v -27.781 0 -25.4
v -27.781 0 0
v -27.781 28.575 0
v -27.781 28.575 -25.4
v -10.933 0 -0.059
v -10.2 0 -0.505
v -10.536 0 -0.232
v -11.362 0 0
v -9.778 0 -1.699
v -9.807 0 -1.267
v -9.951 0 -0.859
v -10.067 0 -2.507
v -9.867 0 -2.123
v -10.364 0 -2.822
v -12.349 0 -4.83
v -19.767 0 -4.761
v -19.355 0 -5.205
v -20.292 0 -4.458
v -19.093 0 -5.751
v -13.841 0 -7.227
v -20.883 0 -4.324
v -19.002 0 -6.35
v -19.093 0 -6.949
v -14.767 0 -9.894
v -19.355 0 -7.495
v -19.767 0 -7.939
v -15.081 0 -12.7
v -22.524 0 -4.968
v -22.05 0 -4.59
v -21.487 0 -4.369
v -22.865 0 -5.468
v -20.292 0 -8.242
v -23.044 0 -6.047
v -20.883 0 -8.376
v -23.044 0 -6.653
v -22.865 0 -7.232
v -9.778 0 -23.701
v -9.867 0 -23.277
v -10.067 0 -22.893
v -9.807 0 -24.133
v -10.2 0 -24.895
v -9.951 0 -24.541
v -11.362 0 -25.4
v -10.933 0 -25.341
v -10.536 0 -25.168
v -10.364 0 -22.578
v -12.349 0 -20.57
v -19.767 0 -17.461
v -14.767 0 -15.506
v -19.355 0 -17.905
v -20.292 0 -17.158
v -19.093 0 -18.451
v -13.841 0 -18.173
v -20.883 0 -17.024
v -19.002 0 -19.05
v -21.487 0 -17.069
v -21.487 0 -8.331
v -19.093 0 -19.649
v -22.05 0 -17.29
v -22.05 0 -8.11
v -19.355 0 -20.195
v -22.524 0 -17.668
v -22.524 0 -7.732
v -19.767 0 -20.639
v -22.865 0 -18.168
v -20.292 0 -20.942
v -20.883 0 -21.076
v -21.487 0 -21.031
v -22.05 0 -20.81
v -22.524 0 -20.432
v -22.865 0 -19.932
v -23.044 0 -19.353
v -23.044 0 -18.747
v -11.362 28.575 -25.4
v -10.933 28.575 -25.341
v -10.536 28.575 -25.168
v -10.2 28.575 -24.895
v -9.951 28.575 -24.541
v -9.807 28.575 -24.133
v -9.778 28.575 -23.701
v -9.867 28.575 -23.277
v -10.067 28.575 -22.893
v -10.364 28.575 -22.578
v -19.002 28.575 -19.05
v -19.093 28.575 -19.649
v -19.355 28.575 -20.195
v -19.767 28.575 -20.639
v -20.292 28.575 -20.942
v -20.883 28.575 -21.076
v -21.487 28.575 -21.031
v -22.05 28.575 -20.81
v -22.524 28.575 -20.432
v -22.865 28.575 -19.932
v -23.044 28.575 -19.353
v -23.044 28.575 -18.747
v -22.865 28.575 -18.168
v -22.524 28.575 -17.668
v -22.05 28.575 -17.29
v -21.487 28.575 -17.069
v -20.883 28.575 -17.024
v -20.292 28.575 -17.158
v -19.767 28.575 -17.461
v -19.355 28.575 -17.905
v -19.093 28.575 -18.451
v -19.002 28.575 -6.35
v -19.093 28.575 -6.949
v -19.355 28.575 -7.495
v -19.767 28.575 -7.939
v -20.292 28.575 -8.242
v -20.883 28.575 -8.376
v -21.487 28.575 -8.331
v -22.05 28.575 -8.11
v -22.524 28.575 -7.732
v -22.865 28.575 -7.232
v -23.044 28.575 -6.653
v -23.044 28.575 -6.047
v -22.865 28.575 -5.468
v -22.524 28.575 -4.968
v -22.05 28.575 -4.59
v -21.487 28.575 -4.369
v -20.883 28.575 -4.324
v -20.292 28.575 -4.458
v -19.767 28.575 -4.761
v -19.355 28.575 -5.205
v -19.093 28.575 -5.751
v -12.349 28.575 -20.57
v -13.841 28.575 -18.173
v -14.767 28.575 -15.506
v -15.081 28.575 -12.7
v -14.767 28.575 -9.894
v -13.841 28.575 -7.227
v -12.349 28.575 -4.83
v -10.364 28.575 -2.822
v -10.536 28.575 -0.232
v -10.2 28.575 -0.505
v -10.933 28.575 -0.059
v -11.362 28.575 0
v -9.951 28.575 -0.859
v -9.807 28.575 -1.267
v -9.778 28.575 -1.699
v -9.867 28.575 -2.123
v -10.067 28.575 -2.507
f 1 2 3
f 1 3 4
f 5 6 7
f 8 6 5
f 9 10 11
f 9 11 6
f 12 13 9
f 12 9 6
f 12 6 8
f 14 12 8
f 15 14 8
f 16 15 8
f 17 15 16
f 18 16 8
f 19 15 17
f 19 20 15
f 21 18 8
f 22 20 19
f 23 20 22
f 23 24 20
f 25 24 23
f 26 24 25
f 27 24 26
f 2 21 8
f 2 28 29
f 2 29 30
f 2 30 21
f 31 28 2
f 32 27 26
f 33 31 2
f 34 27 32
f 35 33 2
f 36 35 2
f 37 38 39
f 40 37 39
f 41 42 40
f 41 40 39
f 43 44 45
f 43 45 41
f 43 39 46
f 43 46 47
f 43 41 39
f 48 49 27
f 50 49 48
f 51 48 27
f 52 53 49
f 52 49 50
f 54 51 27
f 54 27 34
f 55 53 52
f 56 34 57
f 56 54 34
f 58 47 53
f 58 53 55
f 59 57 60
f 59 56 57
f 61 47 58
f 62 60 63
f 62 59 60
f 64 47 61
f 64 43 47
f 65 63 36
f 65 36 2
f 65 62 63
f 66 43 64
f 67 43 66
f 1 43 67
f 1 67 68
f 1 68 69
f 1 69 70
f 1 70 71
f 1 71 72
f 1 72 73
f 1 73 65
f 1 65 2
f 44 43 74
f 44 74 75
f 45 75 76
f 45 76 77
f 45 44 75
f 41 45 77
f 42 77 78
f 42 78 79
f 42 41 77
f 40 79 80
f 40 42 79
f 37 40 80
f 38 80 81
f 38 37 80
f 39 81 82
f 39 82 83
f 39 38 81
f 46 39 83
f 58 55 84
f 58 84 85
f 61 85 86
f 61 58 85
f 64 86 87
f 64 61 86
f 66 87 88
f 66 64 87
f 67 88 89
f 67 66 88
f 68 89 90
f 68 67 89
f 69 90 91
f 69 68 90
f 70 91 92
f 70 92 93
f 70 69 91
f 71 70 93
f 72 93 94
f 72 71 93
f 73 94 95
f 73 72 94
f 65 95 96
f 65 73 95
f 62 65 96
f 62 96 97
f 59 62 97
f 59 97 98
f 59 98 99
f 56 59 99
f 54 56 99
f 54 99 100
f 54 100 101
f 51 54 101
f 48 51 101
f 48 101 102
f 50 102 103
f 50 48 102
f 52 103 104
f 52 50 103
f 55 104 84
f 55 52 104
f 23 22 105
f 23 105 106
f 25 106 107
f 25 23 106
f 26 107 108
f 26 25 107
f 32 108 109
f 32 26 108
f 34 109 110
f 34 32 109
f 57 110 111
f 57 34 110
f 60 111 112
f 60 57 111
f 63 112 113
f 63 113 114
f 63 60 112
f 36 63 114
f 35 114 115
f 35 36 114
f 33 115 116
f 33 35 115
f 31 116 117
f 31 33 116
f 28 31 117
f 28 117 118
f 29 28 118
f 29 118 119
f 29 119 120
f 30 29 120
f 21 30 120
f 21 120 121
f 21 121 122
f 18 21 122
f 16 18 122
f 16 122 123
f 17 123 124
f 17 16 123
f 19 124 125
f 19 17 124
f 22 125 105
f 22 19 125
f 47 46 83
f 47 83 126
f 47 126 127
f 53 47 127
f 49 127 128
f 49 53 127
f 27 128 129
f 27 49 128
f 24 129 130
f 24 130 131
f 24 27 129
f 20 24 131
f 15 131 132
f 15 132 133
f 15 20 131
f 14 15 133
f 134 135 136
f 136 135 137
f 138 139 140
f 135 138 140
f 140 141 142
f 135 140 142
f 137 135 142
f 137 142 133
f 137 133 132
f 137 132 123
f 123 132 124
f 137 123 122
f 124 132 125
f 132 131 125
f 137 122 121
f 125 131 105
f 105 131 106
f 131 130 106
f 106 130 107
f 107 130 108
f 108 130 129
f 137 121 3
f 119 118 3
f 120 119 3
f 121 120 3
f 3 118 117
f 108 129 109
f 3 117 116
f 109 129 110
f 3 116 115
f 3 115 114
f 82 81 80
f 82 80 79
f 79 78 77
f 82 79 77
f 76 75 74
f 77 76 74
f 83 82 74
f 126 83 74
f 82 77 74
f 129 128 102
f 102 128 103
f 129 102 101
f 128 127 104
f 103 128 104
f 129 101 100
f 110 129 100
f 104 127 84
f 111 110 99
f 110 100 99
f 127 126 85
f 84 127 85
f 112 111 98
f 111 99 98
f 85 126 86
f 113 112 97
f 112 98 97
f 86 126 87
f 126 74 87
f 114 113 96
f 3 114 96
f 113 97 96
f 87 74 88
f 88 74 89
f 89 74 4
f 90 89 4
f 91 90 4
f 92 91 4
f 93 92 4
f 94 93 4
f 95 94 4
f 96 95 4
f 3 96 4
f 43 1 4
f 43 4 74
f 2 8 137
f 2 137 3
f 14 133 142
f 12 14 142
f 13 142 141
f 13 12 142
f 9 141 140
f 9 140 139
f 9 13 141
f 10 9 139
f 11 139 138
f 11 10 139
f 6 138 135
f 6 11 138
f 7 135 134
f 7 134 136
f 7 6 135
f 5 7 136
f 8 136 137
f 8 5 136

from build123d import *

# Parameters (mm, degrees)
SKETCH3_R           = 2.032
BOSS_EXTRUDE1_DEPTH = 28.575


with BuildPart() as part:
    # Sketch3 → Boss-Extrude1 (new body)
    with BuildSketch(Plane(origin=(0, 0, 0), x_dir=(1, 0, 0), z_dir=(0, 1, 0))):
        with BuildLine():
            Line((-27.78125, 0), (-27.78125, 25.4))
            Line((-27.78125, 25.4), (-11.361506121, 25.4))
            ThreePointArc((-11.361506121, 25.4), (-9.864796768, 24.341666667), (-10.363699885, 22.577777778))
            ThreePointArc((-10.363699885, 22.577777778), (-15.08125, 12.7), (-10.363699885, 2.822222222))
            ThreePointArc((-10.363699885, 2.822222222), (-9.864796768, 1.058333333), (-11.361506121, 0))
            Line((-11.361506121, 0), (-27.78125, 0))
        make_face()
        with Locations((-21.034375, 6.35)):
            Circle(SKETCH3_R, mode=Mode.SUBTRACT)
        with Locations((-21.034375, 19.05)):
            Circle(SKETCH3_R, mode=Mode.SUBTRACT)
    extrude(amount=BOSS_EXTRUDE1_DEPTH)


solid = part.part
